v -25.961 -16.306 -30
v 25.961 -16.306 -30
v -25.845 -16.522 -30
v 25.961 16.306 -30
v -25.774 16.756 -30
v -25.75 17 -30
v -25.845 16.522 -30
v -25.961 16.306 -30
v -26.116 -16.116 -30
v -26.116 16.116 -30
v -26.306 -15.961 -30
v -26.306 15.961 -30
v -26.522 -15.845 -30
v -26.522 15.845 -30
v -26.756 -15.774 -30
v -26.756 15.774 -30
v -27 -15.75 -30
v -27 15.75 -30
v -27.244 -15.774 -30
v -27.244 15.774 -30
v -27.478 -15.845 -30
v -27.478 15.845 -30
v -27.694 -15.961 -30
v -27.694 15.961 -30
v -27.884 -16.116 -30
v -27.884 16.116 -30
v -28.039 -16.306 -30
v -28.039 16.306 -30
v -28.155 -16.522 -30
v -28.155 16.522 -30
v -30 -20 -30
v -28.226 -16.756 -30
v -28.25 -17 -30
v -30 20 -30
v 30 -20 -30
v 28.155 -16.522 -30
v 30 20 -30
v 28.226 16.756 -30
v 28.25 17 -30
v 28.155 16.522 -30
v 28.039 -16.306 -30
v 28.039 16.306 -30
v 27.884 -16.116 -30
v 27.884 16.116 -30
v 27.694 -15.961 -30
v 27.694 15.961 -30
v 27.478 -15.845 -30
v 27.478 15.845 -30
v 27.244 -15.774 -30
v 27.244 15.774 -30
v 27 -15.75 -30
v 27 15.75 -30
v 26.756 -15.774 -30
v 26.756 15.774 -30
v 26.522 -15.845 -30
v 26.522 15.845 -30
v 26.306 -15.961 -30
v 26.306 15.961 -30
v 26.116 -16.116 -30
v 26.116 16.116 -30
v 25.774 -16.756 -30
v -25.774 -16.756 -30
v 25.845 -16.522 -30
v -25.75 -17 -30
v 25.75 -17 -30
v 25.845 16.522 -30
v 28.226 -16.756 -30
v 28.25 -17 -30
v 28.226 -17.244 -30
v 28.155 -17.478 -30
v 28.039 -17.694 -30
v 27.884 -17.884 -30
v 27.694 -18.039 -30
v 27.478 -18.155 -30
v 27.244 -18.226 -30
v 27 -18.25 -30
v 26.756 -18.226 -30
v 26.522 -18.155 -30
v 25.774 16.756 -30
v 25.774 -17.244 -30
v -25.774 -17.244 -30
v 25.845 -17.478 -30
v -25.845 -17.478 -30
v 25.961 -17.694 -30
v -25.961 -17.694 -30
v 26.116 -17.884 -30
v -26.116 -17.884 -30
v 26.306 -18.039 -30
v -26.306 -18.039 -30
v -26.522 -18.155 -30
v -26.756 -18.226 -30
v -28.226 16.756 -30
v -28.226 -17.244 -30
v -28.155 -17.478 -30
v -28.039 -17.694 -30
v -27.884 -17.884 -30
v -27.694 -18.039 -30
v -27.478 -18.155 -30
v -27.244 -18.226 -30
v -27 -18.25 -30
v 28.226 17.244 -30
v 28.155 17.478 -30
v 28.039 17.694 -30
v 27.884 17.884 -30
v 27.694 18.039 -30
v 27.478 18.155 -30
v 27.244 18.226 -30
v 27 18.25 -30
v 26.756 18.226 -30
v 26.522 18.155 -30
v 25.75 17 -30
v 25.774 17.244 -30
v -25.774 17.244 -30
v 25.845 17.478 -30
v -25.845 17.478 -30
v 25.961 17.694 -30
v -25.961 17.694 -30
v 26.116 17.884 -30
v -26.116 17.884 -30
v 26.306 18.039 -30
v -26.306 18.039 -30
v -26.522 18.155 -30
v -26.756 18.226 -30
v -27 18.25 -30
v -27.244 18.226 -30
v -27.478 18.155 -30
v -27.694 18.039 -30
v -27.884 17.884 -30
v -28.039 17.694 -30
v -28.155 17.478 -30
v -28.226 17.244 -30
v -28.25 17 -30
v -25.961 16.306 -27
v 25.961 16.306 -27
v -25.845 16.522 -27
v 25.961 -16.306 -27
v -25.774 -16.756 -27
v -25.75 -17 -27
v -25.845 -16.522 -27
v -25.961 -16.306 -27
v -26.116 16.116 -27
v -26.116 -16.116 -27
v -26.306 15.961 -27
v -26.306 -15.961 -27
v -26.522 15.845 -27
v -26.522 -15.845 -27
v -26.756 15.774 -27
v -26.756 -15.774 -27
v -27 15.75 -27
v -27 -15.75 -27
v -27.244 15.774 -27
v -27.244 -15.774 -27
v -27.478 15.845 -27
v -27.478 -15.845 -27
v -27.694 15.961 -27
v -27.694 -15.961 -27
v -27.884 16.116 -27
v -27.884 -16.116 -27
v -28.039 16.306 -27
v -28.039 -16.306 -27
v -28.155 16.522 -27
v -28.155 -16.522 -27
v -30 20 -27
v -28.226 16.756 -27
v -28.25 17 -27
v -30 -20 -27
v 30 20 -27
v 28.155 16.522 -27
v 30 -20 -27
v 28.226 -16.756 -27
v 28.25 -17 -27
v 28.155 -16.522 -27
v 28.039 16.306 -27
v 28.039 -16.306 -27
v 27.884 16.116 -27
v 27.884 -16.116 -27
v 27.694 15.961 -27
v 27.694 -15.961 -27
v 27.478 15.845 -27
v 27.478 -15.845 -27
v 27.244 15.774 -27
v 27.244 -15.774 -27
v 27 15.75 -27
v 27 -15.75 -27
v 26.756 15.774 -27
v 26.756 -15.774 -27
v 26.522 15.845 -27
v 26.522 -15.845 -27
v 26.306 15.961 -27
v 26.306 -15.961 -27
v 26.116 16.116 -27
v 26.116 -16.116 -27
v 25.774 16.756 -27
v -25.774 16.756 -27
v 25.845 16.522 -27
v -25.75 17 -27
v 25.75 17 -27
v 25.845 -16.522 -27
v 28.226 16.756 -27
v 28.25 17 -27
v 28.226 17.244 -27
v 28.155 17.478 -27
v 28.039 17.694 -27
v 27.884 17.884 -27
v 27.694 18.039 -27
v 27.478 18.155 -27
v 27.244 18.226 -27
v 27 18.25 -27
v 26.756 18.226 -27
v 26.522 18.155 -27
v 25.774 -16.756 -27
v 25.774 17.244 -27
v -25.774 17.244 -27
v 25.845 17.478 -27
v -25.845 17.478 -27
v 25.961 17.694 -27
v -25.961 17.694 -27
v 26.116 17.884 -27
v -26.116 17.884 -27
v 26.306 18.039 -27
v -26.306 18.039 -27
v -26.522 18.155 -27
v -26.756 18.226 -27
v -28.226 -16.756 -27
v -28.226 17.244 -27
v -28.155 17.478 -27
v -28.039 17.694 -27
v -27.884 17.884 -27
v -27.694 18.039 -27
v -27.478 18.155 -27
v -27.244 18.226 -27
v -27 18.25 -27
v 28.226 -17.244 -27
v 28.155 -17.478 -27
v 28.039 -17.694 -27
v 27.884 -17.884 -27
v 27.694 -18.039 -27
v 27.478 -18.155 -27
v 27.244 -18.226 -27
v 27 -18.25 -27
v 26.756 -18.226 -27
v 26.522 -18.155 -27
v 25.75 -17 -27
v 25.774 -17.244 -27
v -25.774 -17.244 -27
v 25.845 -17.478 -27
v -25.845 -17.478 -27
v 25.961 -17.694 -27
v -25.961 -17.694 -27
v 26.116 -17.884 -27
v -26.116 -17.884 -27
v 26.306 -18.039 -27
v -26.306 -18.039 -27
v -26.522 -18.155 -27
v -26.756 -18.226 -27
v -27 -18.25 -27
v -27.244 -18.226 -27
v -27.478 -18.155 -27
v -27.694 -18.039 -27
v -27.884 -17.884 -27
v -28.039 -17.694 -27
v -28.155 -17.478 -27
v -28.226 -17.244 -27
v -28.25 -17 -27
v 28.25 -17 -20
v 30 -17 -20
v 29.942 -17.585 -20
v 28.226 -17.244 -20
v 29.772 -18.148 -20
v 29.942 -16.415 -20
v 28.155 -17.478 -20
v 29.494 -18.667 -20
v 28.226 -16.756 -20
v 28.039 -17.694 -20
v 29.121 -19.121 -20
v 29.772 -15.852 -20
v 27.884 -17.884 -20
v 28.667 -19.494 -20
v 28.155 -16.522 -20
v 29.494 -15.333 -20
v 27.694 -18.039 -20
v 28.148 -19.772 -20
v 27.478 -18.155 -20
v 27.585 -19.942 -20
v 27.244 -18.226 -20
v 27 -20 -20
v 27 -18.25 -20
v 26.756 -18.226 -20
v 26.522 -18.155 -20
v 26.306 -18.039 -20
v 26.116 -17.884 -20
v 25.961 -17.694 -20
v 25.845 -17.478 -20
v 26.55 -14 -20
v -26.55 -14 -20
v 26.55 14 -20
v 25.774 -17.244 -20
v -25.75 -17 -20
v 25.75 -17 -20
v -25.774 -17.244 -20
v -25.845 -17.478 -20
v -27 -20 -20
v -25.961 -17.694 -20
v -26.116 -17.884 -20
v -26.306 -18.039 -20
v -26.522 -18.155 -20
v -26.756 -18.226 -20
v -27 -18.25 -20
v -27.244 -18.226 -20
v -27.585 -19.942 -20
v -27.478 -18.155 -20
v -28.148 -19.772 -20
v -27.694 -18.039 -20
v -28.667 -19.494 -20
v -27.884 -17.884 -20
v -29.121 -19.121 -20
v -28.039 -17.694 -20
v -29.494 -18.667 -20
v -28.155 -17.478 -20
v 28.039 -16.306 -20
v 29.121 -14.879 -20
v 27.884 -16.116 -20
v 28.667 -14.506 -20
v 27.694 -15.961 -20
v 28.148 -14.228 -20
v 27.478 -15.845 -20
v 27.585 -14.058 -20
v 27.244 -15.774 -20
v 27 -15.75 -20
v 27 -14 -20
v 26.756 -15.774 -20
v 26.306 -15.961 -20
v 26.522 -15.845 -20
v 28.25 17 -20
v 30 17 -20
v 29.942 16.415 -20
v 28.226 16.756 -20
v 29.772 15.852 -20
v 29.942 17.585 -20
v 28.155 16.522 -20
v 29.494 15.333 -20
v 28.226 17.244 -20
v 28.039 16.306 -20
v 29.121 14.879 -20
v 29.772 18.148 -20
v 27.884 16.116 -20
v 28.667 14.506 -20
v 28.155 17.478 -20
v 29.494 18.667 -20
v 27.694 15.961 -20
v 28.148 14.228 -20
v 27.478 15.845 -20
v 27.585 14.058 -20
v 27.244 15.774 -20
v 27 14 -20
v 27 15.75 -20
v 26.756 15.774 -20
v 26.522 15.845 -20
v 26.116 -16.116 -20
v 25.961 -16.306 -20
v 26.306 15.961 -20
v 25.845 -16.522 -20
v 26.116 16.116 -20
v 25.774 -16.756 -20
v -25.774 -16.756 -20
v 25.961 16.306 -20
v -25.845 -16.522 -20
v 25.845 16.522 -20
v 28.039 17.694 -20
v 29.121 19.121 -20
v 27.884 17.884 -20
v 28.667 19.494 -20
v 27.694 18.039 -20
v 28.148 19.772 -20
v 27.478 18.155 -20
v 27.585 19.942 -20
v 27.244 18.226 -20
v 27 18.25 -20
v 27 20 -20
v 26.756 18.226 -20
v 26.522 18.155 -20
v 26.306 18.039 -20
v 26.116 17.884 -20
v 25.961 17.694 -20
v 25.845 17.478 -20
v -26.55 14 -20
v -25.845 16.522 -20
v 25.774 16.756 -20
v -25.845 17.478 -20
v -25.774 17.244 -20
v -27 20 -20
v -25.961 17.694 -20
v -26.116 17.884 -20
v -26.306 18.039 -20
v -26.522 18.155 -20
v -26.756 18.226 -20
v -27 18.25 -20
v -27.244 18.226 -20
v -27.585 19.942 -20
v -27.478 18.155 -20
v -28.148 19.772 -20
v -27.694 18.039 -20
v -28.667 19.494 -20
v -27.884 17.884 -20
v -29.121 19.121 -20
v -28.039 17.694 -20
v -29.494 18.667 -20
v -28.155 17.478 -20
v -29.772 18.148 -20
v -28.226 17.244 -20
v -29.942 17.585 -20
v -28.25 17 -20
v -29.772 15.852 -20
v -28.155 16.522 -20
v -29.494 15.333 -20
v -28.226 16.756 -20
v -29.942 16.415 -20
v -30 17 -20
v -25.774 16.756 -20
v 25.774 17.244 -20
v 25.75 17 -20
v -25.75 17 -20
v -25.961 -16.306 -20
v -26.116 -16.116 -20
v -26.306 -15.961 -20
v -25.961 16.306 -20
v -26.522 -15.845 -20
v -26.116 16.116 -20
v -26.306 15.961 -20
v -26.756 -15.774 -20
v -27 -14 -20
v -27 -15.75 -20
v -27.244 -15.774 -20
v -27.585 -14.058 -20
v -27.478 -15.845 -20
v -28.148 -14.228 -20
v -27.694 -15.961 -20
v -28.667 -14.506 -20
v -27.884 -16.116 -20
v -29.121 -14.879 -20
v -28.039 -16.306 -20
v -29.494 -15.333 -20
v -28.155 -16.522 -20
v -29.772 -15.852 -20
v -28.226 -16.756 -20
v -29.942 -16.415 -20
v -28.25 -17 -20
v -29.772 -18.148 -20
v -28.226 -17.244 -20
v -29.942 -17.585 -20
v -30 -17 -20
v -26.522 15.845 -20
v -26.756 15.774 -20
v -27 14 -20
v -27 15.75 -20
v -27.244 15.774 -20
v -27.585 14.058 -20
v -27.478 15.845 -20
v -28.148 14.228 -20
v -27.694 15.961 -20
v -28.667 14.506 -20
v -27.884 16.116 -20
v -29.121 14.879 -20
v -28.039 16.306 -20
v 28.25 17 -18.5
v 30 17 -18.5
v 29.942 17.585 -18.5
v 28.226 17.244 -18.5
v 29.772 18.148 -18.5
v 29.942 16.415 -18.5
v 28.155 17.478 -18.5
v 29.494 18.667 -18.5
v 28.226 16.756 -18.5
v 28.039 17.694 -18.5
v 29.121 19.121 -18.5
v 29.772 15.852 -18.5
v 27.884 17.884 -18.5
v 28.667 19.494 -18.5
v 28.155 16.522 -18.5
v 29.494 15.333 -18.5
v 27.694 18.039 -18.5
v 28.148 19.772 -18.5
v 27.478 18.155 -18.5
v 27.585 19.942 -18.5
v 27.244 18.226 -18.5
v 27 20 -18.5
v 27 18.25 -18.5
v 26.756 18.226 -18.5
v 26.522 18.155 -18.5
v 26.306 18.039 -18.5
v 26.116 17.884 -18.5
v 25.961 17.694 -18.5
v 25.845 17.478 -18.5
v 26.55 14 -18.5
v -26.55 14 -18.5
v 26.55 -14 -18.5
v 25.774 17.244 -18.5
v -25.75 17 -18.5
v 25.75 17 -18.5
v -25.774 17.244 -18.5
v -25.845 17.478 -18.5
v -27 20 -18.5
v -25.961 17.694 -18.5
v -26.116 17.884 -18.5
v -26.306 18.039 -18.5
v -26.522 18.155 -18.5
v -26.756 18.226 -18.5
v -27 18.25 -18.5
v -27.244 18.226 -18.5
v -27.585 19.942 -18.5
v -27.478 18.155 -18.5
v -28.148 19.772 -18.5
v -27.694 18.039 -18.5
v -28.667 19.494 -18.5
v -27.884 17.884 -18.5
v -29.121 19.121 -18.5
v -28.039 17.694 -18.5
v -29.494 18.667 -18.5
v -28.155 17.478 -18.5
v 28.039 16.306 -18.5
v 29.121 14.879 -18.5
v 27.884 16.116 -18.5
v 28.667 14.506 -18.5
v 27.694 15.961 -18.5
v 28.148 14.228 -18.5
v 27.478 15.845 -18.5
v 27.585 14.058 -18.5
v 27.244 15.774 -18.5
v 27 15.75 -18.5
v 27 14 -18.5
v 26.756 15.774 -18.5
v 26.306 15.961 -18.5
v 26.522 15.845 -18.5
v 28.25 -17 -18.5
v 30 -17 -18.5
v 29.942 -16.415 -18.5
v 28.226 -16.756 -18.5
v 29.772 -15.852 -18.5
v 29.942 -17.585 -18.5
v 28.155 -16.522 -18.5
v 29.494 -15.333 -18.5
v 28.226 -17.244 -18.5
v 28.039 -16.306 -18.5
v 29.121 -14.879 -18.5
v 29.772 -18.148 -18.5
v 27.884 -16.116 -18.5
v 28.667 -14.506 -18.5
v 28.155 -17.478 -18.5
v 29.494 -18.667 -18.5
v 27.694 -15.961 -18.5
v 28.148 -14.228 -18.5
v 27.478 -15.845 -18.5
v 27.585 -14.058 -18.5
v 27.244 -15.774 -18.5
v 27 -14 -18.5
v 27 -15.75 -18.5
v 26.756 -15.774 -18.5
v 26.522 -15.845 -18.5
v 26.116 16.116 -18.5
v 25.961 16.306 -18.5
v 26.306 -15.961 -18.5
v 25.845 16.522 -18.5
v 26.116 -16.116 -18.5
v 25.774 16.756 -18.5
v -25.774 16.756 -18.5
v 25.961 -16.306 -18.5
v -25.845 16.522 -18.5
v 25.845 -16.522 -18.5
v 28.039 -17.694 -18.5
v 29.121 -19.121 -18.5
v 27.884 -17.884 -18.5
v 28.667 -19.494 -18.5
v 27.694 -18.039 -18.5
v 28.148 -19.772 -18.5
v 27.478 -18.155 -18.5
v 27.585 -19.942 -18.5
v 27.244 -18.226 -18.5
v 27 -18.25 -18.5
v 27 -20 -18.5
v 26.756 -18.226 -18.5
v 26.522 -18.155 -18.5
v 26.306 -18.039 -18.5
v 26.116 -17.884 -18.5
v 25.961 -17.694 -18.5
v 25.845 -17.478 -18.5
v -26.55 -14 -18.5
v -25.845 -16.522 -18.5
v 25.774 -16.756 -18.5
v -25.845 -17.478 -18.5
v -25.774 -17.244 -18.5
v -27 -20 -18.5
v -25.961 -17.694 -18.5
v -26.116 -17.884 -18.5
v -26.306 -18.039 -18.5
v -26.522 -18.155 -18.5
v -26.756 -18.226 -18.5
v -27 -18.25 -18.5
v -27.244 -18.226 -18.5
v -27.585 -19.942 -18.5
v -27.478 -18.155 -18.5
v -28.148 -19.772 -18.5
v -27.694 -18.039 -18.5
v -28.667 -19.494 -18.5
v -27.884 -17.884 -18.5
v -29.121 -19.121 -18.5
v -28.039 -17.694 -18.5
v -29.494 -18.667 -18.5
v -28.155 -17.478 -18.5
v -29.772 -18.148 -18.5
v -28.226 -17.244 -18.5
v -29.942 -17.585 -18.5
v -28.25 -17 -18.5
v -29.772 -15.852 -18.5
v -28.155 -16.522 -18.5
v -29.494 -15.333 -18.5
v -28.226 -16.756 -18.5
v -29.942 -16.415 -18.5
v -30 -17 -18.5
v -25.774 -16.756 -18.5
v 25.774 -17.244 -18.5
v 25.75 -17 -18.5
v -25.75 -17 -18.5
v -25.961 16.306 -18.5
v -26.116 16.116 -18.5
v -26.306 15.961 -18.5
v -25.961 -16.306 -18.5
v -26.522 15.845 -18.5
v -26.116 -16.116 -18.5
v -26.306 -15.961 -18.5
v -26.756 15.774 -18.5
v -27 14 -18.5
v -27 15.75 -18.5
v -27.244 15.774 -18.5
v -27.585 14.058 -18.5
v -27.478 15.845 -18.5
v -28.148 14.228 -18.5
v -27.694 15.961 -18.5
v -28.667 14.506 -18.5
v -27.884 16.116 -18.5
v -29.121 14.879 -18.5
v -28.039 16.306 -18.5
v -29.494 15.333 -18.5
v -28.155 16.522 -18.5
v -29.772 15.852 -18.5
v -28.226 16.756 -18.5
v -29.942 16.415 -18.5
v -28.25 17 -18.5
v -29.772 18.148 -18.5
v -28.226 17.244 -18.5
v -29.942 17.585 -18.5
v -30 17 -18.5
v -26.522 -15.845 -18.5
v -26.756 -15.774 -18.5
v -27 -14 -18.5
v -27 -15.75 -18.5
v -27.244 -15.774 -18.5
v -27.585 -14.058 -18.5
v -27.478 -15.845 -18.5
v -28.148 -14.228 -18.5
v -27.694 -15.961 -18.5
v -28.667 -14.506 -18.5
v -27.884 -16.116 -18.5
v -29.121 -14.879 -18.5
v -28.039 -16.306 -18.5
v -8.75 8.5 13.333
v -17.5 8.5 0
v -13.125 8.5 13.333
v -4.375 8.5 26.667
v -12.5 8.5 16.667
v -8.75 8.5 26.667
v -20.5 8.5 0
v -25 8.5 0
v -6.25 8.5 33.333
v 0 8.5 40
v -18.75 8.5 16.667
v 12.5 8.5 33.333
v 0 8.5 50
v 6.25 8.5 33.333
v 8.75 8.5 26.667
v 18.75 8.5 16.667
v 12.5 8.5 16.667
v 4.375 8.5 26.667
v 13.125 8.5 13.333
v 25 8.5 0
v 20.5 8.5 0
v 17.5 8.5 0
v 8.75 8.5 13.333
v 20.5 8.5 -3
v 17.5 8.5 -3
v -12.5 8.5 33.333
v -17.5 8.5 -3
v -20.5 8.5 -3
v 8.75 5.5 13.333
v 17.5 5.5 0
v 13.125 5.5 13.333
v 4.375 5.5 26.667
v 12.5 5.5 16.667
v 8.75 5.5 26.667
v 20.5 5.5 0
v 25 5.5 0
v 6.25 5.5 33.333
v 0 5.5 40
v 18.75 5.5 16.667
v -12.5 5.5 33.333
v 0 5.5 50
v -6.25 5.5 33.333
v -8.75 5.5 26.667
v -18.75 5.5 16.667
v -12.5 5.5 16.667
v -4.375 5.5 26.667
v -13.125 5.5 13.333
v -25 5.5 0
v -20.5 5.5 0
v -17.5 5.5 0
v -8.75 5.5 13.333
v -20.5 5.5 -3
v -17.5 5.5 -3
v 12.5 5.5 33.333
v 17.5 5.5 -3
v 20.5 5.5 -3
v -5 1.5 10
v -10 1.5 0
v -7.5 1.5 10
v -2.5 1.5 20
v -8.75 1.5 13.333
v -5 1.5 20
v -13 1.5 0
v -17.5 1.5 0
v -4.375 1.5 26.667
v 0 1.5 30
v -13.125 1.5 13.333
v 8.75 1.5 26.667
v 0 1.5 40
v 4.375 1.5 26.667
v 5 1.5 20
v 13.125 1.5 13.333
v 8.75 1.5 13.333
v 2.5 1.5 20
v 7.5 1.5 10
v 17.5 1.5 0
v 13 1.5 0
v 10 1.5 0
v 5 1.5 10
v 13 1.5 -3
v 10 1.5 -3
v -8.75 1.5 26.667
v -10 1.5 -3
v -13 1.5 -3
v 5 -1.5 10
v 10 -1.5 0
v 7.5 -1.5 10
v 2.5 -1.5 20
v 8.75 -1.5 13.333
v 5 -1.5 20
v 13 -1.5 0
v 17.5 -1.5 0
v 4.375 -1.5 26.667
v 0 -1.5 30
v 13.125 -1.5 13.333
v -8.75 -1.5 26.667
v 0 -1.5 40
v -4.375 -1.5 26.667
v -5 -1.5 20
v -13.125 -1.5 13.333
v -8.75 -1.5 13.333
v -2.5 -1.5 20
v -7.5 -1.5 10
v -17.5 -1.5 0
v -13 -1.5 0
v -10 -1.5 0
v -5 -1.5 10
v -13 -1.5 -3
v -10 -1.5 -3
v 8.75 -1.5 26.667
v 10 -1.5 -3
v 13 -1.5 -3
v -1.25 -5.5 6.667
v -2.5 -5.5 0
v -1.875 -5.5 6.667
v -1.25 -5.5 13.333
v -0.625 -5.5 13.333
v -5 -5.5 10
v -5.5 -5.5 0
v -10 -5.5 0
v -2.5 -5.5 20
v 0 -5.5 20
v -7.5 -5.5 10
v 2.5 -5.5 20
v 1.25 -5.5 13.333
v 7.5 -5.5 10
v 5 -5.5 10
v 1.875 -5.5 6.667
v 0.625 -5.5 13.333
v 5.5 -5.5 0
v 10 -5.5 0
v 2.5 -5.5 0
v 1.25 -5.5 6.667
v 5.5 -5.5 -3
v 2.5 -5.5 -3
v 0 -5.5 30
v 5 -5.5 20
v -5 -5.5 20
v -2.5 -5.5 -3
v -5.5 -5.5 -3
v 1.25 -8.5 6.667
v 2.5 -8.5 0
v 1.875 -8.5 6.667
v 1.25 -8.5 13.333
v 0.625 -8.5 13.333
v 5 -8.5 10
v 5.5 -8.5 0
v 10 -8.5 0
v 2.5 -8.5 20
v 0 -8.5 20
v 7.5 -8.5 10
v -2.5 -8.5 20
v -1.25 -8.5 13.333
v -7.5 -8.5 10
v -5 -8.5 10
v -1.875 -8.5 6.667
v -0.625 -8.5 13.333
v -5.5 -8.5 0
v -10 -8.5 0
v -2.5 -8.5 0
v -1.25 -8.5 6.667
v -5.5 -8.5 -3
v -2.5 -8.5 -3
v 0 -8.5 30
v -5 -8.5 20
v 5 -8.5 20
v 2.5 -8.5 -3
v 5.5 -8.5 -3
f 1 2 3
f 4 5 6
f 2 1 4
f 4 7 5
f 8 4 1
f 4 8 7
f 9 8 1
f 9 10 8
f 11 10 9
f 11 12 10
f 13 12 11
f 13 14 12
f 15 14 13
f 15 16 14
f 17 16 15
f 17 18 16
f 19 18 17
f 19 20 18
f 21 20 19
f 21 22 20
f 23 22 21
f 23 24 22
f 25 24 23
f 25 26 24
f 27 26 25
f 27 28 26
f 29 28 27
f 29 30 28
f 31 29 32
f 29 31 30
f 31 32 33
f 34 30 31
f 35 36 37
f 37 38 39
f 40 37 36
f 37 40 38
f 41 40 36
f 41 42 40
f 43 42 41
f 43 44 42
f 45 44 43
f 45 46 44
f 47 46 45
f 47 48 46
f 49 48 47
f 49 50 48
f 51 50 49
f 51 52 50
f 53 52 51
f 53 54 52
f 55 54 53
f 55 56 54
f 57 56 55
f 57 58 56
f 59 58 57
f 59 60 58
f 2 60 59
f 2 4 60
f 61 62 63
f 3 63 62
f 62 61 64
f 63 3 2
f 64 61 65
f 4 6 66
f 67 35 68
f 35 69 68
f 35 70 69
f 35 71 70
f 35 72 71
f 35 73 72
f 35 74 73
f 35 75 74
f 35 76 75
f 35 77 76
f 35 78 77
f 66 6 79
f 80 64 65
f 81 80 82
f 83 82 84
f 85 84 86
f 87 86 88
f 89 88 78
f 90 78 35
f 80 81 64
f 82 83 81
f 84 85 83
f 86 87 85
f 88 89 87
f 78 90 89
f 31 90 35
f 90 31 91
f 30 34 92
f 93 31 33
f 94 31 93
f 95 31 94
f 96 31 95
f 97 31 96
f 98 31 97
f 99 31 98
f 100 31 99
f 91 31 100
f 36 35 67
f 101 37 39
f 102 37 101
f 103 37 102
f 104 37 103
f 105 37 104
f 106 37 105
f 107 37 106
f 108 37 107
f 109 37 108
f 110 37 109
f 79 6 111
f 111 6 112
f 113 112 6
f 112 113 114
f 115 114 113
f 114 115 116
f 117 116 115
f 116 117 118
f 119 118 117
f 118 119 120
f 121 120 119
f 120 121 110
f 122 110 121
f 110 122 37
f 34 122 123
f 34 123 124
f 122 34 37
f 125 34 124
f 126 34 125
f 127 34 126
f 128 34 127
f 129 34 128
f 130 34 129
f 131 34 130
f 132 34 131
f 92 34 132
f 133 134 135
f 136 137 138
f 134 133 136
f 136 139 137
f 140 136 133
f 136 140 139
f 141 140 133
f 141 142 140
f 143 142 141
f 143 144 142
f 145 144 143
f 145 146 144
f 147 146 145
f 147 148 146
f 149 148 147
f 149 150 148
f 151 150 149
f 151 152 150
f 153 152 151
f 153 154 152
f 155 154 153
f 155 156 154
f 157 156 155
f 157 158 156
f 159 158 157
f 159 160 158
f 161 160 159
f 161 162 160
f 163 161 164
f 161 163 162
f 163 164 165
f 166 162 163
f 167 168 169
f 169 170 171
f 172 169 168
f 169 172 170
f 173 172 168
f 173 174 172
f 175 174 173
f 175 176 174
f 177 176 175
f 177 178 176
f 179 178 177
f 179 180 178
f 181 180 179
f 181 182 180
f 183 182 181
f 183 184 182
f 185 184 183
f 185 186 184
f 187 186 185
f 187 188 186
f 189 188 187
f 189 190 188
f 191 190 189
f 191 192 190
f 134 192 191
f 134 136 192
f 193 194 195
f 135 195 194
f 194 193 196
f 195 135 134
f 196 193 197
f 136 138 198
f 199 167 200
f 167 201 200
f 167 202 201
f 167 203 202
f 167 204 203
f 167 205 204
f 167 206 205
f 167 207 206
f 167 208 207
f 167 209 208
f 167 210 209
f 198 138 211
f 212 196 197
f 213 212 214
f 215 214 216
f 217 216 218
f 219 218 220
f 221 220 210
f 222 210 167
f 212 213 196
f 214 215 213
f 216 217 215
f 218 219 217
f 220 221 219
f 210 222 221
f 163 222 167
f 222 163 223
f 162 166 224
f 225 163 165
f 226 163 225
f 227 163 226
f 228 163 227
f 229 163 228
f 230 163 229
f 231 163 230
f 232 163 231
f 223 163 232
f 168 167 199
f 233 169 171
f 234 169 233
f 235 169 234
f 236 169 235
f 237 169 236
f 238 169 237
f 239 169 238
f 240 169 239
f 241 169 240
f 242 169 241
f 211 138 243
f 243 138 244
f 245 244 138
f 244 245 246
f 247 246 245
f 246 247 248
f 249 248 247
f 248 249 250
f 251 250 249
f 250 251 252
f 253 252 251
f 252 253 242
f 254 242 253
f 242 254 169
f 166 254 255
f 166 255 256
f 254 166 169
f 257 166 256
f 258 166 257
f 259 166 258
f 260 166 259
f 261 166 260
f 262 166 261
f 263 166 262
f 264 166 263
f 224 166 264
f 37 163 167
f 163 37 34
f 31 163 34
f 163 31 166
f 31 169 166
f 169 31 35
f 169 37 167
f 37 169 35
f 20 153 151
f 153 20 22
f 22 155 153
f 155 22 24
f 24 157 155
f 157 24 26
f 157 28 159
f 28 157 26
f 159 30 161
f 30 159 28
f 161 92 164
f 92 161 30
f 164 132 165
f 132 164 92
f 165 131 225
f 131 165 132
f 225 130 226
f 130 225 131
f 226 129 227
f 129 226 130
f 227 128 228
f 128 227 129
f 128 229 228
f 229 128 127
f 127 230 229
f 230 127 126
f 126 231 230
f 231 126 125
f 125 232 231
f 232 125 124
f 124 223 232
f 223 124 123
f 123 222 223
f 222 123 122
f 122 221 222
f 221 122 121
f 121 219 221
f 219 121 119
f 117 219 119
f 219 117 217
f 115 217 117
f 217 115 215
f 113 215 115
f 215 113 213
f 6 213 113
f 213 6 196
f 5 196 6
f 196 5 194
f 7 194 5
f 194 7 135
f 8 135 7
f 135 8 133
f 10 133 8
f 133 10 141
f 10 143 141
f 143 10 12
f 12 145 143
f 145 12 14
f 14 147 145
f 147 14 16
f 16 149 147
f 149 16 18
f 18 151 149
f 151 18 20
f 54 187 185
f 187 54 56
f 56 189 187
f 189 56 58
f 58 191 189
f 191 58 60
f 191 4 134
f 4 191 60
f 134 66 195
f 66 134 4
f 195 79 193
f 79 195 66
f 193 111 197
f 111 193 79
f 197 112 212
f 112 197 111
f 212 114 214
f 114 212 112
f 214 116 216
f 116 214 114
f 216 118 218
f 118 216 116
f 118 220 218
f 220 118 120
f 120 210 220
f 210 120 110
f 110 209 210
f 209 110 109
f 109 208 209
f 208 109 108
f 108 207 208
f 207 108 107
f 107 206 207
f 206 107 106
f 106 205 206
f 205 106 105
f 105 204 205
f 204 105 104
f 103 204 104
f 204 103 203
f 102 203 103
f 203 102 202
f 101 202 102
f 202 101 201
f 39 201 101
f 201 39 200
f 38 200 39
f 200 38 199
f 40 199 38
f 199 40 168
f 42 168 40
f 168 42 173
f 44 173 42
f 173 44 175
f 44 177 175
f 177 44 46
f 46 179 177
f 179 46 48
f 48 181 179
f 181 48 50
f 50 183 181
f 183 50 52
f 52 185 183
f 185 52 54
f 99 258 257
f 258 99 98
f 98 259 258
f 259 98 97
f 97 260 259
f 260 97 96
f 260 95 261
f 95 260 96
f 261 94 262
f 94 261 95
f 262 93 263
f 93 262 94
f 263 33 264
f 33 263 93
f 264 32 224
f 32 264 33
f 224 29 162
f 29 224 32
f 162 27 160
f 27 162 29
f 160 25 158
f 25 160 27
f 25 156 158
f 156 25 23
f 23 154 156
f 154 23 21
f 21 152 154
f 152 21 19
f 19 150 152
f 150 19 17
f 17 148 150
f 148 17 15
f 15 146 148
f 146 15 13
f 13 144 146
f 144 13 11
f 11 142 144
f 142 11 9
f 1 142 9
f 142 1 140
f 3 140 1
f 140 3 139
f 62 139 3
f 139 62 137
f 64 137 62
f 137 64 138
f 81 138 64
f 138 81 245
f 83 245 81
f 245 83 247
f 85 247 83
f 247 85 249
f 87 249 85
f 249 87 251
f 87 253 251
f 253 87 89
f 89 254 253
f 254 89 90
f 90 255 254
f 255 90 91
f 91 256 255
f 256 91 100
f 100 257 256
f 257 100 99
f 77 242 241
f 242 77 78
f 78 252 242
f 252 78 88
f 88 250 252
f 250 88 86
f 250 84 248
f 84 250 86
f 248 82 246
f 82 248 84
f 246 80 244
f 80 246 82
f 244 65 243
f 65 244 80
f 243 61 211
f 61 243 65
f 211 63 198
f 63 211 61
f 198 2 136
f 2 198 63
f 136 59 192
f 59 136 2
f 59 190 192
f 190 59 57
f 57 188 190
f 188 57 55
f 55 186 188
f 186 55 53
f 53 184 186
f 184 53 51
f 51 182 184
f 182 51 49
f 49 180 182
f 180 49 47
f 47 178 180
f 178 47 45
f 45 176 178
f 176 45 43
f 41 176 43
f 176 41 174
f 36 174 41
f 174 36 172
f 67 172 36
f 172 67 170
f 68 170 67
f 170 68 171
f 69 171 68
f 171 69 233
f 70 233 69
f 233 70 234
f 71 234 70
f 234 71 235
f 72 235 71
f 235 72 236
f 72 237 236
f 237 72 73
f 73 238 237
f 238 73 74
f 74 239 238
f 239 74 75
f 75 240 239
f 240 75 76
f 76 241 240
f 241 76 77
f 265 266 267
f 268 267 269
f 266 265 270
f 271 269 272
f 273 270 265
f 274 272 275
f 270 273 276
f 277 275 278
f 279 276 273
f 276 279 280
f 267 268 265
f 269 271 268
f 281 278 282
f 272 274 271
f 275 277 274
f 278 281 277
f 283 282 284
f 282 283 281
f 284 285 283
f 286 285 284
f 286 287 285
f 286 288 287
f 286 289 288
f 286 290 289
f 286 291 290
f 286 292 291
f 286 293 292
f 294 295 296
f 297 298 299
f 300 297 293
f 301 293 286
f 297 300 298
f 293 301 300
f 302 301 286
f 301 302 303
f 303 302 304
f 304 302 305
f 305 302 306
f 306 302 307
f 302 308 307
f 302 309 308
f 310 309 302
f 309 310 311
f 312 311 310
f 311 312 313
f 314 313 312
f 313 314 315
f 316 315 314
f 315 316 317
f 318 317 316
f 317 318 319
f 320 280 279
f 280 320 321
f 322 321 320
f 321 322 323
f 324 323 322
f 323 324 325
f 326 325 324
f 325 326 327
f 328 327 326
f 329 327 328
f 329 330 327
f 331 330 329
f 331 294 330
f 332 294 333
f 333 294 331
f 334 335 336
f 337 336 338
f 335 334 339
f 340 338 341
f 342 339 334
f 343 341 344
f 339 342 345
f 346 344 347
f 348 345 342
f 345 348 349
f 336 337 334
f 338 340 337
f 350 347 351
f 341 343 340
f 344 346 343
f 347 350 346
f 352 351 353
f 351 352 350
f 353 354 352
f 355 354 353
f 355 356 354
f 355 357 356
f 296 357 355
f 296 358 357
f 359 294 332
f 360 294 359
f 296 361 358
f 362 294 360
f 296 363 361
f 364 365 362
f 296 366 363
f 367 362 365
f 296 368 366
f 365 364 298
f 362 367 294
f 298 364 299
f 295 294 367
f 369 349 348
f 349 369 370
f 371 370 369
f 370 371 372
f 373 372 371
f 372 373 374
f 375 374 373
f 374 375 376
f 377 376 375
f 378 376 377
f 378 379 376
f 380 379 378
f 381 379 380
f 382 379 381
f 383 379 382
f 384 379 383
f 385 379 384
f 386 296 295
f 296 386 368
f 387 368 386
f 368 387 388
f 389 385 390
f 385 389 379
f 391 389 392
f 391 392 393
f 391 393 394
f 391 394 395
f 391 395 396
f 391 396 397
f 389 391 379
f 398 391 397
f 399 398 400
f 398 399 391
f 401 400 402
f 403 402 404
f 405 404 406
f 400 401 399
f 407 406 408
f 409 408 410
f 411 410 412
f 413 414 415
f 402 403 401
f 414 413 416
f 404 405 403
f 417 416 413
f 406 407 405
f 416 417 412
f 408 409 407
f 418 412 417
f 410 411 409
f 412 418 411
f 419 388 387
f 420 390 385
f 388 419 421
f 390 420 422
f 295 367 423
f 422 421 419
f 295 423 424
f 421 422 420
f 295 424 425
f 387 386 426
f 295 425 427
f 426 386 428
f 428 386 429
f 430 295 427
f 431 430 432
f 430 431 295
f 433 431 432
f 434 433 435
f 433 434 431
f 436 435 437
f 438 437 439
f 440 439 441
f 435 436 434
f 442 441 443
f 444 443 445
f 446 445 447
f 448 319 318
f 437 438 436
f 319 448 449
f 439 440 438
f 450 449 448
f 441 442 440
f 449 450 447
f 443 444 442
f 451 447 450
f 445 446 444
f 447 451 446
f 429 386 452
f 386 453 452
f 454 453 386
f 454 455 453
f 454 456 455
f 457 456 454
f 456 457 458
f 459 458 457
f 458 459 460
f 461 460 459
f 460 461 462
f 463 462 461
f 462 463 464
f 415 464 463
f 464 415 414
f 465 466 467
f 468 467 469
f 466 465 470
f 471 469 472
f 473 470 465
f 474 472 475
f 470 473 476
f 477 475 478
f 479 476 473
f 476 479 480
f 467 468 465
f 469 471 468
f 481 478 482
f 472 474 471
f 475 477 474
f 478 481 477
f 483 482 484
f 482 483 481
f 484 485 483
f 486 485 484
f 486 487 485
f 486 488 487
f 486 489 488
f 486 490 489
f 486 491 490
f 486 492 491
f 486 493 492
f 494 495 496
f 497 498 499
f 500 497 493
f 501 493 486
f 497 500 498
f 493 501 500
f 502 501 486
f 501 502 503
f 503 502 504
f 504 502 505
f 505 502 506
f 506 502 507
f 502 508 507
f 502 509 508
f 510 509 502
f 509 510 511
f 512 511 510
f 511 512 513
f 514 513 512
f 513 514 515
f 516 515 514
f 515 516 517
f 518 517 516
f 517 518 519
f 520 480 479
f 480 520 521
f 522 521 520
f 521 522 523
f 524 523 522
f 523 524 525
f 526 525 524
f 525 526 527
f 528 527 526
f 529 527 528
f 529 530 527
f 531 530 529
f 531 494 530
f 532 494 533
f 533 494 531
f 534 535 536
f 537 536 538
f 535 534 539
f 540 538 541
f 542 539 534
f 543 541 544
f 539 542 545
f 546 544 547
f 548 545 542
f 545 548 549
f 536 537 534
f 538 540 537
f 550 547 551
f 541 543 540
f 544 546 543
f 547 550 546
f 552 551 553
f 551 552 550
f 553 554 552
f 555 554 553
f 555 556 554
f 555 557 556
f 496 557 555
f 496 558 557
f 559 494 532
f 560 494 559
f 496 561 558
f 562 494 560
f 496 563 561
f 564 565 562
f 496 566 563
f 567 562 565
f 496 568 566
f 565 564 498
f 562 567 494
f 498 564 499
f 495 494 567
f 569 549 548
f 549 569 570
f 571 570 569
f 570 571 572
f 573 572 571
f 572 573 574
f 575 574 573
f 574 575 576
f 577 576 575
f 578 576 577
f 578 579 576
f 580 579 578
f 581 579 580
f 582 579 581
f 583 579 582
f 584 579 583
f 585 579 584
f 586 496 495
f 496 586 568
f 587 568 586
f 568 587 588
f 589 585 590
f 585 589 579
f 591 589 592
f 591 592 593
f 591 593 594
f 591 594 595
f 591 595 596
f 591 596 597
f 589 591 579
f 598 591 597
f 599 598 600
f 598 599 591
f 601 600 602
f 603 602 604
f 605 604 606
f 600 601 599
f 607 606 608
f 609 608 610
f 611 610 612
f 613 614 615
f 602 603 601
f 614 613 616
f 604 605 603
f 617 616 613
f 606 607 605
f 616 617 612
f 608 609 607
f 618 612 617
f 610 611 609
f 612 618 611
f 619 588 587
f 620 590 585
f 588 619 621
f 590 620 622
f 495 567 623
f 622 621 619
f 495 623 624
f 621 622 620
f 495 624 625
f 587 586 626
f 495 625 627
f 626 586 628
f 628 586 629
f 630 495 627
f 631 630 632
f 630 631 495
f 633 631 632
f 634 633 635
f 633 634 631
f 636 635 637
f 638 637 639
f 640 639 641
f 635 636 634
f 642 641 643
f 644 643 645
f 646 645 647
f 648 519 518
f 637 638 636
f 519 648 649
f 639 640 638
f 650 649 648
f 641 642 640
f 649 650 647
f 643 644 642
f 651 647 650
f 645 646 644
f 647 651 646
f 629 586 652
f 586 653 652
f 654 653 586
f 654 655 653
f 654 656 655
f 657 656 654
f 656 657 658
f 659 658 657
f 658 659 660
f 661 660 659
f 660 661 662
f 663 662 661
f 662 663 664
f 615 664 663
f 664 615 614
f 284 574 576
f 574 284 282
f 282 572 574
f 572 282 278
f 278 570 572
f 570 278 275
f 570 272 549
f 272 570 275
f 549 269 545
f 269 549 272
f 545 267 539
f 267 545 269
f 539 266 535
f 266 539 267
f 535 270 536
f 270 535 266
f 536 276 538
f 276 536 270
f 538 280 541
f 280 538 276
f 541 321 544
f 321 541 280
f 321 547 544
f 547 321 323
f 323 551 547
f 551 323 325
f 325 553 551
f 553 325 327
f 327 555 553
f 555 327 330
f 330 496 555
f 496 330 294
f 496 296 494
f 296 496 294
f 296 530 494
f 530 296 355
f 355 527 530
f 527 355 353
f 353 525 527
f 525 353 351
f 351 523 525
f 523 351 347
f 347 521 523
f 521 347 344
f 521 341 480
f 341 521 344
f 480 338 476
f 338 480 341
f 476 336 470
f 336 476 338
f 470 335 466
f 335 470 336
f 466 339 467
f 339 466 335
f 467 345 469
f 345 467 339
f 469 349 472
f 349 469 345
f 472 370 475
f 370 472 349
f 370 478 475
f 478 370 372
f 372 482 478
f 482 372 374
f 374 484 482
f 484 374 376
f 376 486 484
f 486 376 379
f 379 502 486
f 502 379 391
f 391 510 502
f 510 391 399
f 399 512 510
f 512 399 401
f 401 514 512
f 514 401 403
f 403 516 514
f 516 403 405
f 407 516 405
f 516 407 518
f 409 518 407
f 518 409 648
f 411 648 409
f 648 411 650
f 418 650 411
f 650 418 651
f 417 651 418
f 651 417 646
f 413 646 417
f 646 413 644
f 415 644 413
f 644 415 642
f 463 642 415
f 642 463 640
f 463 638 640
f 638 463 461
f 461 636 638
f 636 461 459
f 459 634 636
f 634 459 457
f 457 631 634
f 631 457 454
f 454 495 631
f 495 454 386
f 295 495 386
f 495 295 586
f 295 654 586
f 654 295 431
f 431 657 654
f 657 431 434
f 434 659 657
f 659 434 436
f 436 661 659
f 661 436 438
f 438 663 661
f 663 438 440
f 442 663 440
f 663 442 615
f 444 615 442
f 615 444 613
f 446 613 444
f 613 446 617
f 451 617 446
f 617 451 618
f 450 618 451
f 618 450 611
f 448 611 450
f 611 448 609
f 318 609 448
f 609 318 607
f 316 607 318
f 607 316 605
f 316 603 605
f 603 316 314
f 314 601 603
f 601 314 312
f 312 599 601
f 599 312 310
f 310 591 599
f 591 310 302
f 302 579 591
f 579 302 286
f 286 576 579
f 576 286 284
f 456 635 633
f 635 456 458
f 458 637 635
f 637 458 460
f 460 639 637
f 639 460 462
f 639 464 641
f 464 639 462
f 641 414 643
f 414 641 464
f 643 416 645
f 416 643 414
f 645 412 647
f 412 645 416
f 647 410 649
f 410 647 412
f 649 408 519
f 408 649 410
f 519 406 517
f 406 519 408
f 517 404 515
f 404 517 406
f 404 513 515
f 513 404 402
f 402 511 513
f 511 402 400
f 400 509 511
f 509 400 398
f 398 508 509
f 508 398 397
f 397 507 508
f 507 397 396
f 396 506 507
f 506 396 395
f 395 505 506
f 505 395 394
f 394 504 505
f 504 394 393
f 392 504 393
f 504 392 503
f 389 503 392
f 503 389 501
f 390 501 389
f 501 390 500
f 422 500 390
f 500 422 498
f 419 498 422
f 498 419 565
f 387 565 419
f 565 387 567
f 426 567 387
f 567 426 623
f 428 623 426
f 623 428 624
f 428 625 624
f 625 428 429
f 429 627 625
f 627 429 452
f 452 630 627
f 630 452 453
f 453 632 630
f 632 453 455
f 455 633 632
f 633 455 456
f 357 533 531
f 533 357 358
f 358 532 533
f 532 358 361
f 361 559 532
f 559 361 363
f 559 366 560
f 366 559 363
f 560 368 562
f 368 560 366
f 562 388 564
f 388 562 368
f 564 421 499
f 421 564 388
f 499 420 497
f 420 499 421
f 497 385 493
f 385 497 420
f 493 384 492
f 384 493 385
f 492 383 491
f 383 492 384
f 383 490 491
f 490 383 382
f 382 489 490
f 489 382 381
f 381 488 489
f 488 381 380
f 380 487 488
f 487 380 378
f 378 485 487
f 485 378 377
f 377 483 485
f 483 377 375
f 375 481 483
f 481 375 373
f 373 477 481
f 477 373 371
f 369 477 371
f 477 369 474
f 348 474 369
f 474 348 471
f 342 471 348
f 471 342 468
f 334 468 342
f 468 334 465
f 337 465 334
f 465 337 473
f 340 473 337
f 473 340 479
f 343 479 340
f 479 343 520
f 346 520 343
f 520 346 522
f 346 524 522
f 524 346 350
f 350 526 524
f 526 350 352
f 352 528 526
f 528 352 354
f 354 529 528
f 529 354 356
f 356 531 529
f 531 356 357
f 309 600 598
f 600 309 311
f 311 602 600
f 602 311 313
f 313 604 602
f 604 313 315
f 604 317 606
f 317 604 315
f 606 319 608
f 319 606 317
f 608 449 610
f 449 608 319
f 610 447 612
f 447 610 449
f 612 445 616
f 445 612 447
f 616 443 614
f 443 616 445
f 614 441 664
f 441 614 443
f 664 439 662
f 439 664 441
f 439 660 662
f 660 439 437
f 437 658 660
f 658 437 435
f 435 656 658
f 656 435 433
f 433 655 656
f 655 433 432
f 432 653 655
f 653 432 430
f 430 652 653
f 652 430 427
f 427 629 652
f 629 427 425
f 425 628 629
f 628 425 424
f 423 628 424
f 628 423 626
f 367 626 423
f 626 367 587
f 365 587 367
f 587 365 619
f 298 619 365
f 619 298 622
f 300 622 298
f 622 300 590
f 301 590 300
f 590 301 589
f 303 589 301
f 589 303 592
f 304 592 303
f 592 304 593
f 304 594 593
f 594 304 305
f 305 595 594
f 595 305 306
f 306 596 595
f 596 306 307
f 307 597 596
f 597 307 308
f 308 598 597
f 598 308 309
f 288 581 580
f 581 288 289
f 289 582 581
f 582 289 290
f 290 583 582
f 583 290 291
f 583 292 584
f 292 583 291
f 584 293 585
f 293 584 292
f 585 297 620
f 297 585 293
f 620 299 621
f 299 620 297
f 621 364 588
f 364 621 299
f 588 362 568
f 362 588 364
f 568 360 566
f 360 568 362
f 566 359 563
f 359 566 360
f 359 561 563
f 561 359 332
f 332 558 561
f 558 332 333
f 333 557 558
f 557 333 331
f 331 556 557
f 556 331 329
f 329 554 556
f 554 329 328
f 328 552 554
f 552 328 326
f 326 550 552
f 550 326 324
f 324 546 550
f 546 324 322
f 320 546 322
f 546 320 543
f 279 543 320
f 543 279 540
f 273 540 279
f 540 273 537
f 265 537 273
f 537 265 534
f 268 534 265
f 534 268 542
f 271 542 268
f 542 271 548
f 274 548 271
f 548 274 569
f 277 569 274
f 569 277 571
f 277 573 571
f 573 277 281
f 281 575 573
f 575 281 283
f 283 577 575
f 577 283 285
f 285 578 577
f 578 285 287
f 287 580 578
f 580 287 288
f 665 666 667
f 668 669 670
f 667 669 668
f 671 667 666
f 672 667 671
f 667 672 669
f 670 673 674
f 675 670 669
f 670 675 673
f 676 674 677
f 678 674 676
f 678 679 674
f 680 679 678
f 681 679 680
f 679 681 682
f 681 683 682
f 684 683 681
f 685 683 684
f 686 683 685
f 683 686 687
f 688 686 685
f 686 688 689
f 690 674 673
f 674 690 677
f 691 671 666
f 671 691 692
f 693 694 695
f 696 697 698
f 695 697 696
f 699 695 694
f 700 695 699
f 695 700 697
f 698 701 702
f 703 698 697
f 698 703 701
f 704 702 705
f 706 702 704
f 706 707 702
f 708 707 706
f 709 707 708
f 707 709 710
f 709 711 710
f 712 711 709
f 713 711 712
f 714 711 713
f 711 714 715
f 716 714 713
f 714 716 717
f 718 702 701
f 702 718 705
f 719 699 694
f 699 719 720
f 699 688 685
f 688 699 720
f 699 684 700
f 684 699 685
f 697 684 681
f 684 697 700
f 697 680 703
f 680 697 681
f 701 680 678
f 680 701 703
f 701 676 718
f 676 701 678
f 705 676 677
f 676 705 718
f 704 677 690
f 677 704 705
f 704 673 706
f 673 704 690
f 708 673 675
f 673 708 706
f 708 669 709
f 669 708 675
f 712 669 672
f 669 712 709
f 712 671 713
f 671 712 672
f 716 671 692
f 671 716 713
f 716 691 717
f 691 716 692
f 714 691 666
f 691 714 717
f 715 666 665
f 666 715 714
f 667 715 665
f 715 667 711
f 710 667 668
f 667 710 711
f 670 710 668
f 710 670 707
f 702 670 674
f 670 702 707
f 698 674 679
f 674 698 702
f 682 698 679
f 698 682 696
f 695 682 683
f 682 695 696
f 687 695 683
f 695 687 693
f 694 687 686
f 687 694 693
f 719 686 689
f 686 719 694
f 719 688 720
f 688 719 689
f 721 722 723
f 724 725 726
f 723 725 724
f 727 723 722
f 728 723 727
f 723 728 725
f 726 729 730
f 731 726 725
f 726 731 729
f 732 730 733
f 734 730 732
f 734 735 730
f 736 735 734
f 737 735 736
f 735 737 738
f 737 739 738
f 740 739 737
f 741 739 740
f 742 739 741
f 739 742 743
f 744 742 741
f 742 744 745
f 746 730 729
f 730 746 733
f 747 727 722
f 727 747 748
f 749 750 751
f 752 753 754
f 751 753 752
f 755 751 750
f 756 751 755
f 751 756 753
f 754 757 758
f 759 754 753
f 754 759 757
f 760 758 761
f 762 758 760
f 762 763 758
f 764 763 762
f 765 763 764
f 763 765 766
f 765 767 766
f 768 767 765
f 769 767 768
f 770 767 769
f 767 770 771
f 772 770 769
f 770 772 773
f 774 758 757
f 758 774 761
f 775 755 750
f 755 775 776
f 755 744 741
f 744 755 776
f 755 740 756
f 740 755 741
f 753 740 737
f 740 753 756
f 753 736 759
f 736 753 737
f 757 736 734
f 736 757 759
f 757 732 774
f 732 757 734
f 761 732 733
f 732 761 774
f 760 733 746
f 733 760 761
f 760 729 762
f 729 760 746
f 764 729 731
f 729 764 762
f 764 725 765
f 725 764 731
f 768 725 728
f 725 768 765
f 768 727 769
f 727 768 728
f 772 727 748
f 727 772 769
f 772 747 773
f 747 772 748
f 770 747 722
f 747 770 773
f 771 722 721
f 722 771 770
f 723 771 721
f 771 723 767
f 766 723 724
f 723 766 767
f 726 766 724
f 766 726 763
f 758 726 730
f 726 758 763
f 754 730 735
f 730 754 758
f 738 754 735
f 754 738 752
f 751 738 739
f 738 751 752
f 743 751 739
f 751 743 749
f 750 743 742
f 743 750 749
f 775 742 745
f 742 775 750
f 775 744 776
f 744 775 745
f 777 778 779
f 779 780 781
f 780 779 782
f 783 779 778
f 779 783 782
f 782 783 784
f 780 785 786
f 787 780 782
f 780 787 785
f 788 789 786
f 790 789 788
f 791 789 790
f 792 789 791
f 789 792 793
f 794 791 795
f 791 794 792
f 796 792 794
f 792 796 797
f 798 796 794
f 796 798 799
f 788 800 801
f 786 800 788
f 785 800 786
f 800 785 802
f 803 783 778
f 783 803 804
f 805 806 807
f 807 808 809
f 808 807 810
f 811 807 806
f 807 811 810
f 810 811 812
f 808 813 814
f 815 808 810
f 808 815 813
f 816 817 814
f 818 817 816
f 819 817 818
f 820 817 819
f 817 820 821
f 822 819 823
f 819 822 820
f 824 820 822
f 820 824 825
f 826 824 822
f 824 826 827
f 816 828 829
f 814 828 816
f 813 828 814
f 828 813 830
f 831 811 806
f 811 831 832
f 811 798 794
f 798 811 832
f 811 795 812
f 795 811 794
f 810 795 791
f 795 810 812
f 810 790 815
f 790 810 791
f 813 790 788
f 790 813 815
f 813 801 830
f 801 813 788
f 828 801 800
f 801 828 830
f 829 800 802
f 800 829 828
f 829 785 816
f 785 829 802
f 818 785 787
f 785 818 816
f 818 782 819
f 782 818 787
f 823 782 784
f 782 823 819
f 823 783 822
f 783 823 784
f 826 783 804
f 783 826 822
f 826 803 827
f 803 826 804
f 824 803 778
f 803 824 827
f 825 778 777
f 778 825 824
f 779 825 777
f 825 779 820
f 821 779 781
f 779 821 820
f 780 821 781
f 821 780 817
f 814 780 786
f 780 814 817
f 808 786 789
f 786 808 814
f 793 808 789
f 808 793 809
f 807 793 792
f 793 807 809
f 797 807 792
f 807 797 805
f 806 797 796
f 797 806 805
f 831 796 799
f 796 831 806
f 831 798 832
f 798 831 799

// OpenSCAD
//Height Settings (for each color assign the extrusion height in mm, this is the height of the model that you will need to swap the plastic over)
print_thickness = 1.5;
plate_thickness = 3;
plate_width = 40;
plate_length = 60;
tree_dist = 7;
bold_dia=2.5;
led_dia=4;
$fn=32;

bold_dist = [27, 17];

//Tree Measurements  
//Tree Height (not the extruded height) 
    th1 = 50; 
    th2 = 40;
    th3 = 30;
    th4 = 20;
//Tree Width 
    tw1 = 50;
    tw2 = 35;
    tw3 = 20;
    tw4 = 5;
//Tree Points (not adjustable yet, so please leave it at 3, but in future plans)
    tp = 3;

translate([0, 0, -10])
    linear_extrude (height=plate_thickness)
        base_plate(true);

translate([0, 0, -30])
    linear_extrude (height=plate_thickness)
        base_plate(false);


translate([0, 0, -20])
    linear_extrude (height=print_thickness)
        print();

translate([0, tree_dist + plate_thickness/2, 0])
    rotate([90, 0, 0])
        linear_extrude (height=plate_thickness)
            tree1();

translate([0, plate_thickness/2, 0])
    rotate([90, 0, 0])
        linear_extrude (height=plate_thickness)
            tree2();

translate([0, -tree_dist + plate_thickness/2 , 0])
    rotate([90, 0, 0])
        linear_extrude (height=plate_thickness)
            tree3();

module base_plate(is_mountplate=false)
{
    difference()
    {
        square([plate_length, plate_width], center = true);
        
        if(is_mountplate)
        {
            translate([0, tree_dist + plate_thickness/2, 0])
                treemounts(tw1);
            translate([0,  plate_thickness/2, 0])
                treemounts(tw2);
            translate([0, -tree_dist + plate_thickness/2, 0])
                treemounts(tw3);
            
            // leds
            for(x = [-22.5, -7.5, 7.5, 22.5])
                for(y = [-7.5, 0, 7.5])
                    translate([x, y])
                        circle(d=led_dia);
        }
        mount_holes();
    }
}

module tree1()
{
    union()
    {
        difference()
        {
            tree(th1, tw1, tp);
            tree(th2, tw2, tp);
        }
        treemounts(tw1);
    }
}

module tree2()
{
    union()
    {
        difference()
        {
            tree(th2, tw2, tp);
            tree(th3, tw3, tp);
        }
        treemounts(tw2);
    }
}

module tree3()
{
    union()
    {
        difference()
        {
            tree(th3, tw3, tp);
            tree(th4, tw4, tp);
        }
        treemounts(tw3);
    }
}

module treemounts(tw)
{
    translate([((tw/2) - (plate_thickness*2)), -plate_thickness/2])
        square([plate_thickness, plate_thickness], center = true);
    translate([-((tw/2) - (plate_thickness*2)), -plate_thickness/2])
        square([plate_thickness, plate_thickness], center = true);
}
module tree(th, tw, tp)
{
    tw2 = tw/2;

        // Tree calculations
    pw = tw/(2*(tp+1));
    ph = th/(tp);
    ht = tw/2;
   
  // Draw Tree (height 1)
    polygon (points = 
        [[-tw2, 0], 
        [tw2, 0], 
        [tw2 - (2 * pw), ph], 
        [tw2 - pw, ph], 
        [tw2 - (3*pw), 2*ph], 
        [tw2 - (2*pw), 2*ph], 
        [tw2 - (4*pw), 3*ph], 
        [-tw2 + 2 * pw, 2*ph], 
        [-tw2 + 3 * pw, 2*ph], 
        [-tw2 + pw, ph], 
        [-tw2 + 2 * pw, ph]
        ]);
}

module print()
{
    difference()
    {
        union()
        {
            square([60 - 2 * 3.45, 40], center=true);
            hull()
            {
                translate([ -27, 17]) circle(d=6);
                translate([  27, 17]) circle(d=6);
            }
            hull()
            {
                translate([ -27, -17]) circle(d=6);
                translate([  27, -17]) circle(d=6);
            }
        }
        mount_holes();
    }
}

module mount_holes()
{
    // mount holes
    // [-9, -21.5] -> [9, 21.5]
    echo(bold_dist);
    for(x = [-bold_dist[0], bold_dist[0]])
        for(y = [-bold_dist[1], bold_dist[1]])
            translate([x, y])
                circle(d=bold_dia);
}
